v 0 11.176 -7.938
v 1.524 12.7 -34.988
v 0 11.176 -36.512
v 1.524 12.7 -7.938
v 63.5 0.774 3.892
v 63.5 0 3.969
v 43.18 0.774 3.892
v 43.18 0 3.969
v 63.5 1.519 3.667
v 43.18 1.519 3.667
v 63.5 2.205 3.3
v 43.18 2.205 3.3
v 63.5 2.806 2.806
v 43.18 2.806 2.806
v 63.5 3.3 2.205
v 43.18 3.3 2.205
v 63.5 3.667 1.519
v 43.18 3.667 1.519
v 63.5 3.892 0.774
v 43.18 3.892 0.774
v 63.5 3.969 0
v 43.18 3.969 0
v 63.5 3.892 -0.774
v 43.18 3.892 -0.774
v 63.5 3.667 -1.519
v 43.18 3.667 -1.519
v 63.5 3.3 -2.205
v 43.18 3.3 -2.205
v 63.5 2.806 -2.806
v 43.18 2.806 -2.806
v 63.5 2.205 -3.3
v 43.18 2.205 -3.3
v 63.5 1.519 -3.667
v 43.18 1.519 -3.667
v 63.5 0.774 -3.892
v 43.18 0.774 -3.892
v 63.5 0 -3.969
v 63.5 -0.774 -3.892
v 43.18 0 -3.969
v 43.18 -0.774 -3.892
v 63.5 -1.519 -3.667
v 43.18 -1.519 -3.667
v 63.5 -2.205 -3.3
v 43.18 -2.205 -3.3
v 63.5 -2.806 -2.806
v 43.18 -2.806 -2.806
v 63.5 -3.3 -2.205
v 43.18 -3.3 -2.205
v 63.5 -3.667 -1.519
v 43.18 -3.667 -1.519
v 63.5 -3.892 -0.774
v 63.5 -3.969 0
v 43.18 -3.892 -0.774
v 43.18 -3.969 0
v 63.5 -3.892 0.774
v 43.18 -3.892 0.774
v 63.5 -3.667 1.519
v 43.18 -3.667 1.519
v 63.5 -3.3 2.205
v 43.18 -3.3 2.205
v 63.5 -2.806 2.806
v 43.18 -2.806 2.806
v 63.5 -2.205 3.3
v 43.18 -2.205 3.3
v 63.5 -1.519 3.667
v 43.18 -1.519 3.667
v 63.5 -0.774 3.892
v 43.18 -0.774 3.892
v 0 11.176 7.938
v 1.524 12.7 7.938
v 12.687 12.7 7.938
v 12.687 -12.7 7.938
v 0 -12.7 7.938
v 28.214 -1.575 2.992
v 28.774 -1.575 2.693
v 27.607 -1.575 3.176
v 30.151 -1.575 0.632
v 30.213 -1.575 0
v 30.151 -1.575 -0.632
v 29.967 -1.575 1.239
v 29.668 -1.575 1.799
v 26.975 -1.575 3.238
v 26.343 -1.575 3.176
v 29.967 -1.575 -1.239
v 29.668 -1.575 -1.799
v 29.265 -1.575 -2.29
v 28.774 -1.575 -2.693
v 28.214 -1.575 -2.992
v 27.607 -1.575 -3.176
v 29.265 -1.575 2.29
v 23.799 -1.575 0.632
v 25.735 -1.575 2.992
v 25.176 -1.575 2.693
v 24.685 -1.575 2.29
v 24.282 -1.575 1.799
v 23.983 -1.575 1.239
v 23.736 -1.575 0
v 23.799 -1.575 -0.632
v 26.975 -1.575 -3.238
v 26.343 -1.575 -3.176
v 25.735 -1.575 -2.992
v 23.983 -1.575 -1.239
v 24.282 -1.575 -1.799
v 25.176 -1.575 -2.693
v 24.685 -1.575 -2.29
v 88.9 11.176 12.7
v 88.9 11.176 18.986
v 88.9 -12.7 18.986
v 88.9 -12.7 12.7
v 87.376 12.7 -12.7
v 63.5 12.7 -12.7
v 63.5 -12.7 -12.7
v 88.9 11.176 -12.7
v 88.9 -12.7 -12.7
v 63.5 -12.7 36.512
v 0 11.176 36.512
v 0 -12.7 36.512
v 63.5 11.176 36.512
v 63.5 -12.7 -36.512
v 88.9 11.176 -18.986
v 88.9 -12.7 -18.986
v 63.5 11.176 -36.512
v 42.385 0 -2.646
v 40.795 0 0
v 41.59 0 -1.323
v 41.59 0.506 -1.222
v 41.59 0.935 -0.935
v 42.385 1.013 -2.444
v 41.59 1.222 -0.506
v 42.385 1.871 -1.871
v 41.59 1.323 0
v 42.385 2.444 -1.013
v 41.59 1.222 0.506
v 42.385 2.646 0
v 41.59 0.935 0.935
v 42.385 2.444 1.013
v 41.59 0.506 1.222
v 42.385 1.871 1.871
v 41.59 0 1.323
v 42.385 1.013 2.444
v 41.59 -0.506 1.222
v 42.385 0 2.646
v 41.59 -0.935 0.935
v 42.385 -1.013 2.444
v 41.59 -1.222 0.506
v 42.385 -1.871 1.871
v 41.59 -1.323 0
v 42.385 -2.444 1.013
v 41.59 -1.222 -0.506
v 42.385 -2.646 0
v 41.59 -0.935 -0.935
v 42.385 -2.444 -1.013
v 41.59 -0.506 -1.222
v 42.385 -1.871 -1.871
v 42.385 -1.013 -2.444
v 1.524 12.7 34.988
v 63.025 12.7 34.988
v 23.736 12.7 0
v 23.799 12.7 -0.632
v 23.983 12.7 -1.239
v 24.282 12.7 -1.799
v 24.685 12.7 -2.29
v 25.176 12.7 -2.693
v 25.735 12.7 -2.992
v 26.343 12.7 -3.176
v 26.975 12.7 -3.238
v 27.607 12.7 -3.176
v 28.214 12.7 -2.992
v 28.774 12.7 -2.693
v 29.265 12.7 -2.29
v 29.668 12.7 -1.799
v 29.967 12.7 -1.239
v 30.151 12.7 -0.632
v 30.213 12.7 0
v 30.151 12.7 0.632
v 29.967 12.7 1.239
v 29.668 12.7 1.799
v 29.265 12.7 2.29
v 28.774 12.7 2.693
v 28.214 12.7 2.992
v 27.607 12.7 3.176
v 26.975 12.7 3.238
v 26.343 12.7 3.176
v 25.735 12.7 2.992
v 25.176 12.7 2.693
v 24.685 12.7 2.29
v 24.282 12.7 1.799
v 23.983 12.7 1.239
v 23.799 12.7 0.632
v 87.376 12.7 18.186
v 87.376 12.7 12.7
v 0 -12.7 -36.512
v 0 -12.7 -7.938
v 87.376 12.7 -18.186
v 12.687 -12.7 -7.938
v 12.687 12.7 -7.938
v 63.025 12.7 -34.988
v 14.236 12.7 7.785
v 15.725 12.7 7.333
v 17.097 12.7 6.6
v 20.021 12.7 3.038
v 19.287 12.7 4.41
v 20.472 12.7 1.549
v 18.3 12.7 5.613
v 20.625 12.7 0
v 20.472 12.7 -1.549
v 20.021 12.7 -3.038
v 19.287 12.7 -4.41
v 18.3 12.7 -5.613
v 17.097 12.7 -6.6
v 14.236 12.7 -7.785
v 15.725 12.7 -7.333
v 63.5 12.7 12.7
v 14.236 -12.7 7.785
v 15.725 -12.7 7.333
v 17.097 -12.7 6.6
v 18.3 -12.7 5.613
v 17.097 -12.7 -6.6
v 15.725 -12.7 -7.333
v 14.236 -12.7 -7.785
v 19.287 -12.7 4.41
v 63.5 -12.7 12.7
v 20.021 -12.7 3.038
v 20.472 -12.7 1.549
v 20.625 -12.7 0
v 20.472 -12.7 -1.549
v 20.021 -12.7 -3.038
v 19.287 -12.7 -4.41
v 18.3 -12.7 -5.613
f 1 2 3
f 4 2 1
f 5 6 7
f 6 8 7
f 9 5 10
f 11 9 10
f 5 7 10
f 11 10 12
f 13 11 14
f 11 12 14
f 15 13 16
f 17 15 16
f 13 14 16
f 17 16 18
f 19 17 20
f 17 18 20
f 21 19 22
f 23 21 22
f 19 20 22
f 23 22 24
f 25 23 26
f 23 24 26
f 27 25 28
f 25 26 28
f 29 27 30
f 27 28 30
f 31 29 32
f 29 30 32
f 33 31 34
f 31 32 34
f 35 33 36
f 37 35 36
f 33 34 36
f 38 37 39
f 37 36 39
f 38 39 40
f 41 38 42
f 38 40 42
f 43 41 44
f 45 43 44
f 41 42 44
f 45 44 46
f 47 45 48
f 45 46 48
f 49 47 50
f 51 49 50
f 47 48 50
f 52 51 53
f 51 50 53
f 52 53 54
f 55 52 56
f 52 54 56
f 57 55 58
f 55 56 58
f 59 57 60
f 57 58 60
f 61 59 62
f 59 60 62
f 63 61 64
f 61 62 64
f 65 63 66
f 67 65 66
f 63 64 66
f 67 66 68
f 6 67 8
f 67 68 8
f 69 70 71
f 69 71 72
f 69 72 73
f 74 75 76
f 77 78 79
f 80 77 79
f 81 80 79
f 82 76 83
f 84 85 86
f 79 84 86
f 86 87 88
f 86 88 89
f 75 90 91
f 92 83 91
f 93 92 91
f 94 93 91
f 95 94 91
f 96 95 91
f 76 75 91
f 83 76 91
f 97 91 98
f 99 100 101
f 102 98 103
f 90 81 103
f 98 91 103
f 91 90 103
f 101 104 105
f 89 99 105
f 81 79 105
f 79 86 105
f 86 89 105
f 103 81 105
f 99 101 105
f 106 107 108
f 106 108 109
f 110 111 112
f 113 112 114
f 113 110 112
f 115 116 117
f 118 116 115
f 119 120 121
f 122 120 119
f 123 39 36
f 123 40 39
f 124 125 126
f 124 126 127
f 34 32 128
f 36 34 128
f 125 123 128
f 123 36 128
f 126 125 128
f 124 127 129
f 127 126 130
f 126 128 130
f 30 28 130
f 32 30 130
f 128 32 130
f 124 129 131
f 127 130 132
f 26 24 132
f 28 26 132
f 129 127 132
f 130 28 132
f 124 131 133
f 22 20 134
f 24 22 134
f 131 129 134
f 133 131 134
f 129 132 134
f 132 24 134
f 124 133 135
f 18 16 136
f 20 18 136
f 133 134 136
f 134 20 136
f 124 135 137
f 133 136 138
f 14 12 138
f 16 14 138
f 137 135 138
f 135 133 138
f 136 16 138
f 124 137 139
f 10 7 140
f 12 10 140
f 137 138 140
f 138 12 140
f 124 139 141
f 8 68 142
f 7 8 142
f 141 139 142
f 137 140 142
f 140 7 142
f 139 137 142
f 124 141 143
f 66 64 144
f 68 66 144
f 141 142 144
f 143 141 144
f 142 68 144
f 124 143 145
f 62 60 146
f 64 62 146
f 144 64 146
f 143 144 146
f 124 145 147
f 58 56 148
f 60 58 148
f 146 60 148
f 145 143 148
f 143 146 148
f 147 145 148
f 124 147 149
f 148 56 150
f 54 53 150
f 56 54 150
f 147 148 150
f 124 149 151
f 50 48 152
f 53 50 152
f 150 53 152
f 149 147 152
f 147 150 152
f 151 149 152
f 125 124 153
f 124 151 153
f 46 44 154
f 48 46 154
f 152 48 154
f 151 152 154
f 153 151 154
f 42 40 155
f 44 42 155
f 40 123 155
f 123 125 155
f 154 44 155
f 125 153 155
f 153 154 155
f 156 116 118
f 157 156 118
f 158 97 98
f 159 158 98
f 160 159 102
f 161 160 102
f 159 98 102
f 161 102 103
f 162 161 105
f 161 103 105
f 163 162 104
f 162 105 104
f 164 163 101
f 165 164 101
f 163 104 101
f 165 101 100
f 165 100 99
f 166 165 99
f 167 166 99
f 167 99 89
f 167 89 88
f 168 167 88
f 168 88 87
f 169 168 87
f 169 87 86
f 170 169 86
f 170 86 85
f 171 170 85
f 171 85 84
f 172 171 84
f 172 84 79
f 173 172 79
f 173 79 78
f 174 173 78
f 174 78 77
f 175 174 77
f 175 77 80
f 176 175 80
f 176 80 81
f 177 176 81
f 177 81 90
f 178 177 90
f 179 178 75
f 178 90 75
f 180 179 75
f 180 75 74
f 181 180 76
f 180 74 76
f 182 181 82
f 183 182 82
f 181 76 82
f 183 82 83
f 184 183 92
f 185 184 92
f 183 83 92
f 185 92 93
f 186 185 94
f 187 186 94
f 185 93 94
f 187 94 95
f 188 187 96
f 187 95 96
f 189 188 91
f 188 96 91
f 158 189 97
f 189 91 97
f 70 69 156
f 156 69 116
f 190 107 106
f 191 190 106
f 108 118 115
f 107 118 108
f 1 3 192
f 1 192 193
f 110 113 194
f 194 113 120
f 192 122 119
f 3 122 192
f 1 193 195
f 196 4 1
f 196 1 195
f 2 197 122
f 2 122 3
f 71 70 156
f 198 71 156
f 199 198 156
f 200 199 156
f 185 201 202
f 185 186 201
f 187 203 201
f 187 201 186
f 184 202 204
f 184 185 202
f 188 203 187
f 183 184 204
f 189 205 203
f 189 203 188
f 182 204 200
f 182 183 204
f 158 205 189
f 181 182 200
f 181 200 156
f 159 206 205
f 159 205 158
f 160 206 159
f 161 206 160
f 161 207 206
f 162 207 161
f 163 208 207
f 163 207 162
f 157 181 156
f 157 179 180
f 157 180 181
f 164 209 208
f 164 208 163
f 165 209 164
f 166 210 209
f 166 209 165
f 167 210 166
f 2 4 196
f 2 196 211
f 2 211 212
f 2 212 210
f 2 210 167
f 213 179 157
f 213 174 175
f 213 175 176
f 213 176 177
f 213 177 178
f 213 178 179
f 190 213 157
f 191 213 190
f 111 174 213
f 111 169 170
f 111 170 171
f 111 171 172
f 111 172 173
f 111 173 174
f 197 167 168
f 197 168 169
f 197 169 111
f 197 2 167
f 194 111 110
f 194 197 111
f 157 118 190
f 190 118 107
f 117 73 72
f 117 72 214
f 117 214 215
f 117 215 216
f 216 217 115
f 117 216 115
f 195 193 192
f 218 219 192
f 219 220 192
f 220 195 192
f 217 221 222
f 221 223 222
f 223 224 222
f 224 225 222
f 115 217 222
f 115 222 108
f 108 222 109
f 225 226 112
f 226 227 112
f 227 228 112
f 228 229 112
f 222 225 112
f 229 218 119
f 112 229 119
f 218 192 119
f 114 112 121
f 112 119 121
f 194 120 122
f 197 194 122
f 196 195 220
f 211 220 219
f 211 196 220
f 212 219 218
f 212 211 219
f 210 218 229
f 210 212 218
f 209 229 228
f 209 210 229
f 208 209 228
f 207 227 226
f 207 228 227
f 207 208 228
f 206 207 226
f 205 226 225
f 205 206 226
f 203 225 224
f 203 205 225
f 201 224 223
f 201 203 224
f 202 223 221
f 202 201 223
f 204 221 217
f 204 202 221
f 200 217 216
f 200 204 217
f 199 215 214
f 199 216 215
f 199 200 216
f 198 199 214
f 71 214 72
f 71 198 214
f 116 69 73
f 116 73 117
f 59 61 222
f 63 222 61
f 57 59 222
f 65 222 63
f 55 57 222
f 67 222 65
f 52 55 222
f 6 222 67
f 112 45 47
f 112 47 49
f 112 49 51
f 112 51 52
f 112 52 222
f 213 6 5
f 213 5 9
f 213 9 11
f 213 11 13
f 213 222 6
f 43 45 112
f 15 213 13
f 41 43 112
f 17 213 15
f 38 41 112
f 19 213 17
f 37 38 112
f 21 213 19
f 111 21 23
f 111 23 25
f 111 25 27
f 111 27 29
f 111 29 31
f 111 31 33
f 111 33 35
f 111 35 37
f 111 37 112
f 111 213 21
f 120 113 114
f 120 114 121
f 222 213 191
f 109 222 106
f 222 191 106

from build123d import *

# Parameters (mm, degrees)
BOSS_EXTRUDE2_DEPTH         = 12.7
SKETCH3_W                   = 25.4
SKETCH3_H                   = 25.4
CUT_EXTRUDE1_DEPTH          = 26.4
CUT_EXTRUDE3_DEPTH          = 26.4
HOLE1_D                     = 6.477
HOLE1_DEPTH                 = 14.2748
F_3_8_16_TAPPED_HOLE1_D     = 7.9375
F_3_8_16_TAPPED_HOLE1_DEPTH = 20.32
F_3_8_16_TAPPED_HOLE1_TIP   = 2.384665582
CHAMFER1_SIZE               = 1.524


with BuildPart() as part:
    # Sketch2 → Boss-Extrude2 (new body, symmetric)
    with BuildSketch(Plane(origin=(0, 0, 0), x_dir=(1, 0, 0), z_dir=(0, 1, 0))):
        Polygon((0, 36.5125), (0, -36.5125), (63.5, -36.5125), (88.9, -18.9865), (88.9, 18.9865), (63.5, 36.5125), align=None)
    extrude(amount=BOSS_EXTRUDE2_DEPTH, both=True)

    # Sketch3 → Cut-Extrude1 (cut, through all)
    with BuildSketch(Plane(origin=(0, 12.7, 0), x_dir=(1, 0, 0), z_dir=(0, 1, 0))):
        with Locations((76.2, 0)):
            Rectangle(SKETCH3_W, SKETCH3_H)
    extrude(amount=-CUT_EXTRUDE1_DEPTH, mode=Mode.SUBTRACT)

    # Sketch4 → Cut-Extrude3 (cut, through all)
    with BuildSketch(Plane(origin=(0, 12.7, 0), x_dir=(1, 0, 0), z_dir=(0, 1, 0))):
        with BuildLine():
            Line((0, 7.9375), (12.6873, 7.9375))
            ThreePointArc((12.6873, 7.9375), (20.6248, 0), (12.6873, -7.9375))
            Line((12.6873, -7.9375), (0, -7.9375))
            Line((0, -7.9375), (0, 7.9375))
        make_face()
    extrude(amount=-CUT_EXTRUDE3_DEPTH, mode=Mode.SUBTRACT)

    # Hole1
    with Locations(Plane(origin=(0, 12.7, 0), x_dir=(1, 0, 0), z_dir=(0, 1, 0))):
        with Locations((26.9748, 0)):
            Hole(HOLE1_D / 2, depth=HOLE1_DEPTH)

    # 3/8-16 Tapped Hole1
    with Locations(Plane(origin=(63.5, 0, 0), x_dir=(0, 0, -1), z_dir=(1, 0, 0))):
        with Locations((0, 0)):
            Hole(F_3_8_16_TAPPED_HOLE1_D / 2, depth=F_3_8_16_TAPPED_HOLE1_DEPTH)
            with Locations((0, 0, -(F_3_8_16_TAPPED_HOLE1_DEPTH + F_3_8_16_TAPPED_HOLE1_TIP / 2))):  # 118° drill point
                Cone(0, F_3_8_16_TAPPED_HOLE1_D / 2, F_3_8_16_TAPPED_HOLE1_TIP, mode=Mode.SUBTRACT)

    # Chamfer1
    chamfer1_edges = [part.edges().sort_by_distance(p)[0] for p in [
        (31.75, 12.7, 36.5125),
        (76.2, 12.7, 27.7495),
        (88.9, 12.7, 15.84325),
        (76.2, 12.7, -27.7495),
        (88.9, 12.7, -15.84325),
        (0, 12.7, 22.225),
        (31.75, 12.7, -36.5125),
        (0, 12.7, -22.225),
    ]]
    chamfer(chamfer1_edges, length=CHAMFER1_SIZE)


solid = part.part
